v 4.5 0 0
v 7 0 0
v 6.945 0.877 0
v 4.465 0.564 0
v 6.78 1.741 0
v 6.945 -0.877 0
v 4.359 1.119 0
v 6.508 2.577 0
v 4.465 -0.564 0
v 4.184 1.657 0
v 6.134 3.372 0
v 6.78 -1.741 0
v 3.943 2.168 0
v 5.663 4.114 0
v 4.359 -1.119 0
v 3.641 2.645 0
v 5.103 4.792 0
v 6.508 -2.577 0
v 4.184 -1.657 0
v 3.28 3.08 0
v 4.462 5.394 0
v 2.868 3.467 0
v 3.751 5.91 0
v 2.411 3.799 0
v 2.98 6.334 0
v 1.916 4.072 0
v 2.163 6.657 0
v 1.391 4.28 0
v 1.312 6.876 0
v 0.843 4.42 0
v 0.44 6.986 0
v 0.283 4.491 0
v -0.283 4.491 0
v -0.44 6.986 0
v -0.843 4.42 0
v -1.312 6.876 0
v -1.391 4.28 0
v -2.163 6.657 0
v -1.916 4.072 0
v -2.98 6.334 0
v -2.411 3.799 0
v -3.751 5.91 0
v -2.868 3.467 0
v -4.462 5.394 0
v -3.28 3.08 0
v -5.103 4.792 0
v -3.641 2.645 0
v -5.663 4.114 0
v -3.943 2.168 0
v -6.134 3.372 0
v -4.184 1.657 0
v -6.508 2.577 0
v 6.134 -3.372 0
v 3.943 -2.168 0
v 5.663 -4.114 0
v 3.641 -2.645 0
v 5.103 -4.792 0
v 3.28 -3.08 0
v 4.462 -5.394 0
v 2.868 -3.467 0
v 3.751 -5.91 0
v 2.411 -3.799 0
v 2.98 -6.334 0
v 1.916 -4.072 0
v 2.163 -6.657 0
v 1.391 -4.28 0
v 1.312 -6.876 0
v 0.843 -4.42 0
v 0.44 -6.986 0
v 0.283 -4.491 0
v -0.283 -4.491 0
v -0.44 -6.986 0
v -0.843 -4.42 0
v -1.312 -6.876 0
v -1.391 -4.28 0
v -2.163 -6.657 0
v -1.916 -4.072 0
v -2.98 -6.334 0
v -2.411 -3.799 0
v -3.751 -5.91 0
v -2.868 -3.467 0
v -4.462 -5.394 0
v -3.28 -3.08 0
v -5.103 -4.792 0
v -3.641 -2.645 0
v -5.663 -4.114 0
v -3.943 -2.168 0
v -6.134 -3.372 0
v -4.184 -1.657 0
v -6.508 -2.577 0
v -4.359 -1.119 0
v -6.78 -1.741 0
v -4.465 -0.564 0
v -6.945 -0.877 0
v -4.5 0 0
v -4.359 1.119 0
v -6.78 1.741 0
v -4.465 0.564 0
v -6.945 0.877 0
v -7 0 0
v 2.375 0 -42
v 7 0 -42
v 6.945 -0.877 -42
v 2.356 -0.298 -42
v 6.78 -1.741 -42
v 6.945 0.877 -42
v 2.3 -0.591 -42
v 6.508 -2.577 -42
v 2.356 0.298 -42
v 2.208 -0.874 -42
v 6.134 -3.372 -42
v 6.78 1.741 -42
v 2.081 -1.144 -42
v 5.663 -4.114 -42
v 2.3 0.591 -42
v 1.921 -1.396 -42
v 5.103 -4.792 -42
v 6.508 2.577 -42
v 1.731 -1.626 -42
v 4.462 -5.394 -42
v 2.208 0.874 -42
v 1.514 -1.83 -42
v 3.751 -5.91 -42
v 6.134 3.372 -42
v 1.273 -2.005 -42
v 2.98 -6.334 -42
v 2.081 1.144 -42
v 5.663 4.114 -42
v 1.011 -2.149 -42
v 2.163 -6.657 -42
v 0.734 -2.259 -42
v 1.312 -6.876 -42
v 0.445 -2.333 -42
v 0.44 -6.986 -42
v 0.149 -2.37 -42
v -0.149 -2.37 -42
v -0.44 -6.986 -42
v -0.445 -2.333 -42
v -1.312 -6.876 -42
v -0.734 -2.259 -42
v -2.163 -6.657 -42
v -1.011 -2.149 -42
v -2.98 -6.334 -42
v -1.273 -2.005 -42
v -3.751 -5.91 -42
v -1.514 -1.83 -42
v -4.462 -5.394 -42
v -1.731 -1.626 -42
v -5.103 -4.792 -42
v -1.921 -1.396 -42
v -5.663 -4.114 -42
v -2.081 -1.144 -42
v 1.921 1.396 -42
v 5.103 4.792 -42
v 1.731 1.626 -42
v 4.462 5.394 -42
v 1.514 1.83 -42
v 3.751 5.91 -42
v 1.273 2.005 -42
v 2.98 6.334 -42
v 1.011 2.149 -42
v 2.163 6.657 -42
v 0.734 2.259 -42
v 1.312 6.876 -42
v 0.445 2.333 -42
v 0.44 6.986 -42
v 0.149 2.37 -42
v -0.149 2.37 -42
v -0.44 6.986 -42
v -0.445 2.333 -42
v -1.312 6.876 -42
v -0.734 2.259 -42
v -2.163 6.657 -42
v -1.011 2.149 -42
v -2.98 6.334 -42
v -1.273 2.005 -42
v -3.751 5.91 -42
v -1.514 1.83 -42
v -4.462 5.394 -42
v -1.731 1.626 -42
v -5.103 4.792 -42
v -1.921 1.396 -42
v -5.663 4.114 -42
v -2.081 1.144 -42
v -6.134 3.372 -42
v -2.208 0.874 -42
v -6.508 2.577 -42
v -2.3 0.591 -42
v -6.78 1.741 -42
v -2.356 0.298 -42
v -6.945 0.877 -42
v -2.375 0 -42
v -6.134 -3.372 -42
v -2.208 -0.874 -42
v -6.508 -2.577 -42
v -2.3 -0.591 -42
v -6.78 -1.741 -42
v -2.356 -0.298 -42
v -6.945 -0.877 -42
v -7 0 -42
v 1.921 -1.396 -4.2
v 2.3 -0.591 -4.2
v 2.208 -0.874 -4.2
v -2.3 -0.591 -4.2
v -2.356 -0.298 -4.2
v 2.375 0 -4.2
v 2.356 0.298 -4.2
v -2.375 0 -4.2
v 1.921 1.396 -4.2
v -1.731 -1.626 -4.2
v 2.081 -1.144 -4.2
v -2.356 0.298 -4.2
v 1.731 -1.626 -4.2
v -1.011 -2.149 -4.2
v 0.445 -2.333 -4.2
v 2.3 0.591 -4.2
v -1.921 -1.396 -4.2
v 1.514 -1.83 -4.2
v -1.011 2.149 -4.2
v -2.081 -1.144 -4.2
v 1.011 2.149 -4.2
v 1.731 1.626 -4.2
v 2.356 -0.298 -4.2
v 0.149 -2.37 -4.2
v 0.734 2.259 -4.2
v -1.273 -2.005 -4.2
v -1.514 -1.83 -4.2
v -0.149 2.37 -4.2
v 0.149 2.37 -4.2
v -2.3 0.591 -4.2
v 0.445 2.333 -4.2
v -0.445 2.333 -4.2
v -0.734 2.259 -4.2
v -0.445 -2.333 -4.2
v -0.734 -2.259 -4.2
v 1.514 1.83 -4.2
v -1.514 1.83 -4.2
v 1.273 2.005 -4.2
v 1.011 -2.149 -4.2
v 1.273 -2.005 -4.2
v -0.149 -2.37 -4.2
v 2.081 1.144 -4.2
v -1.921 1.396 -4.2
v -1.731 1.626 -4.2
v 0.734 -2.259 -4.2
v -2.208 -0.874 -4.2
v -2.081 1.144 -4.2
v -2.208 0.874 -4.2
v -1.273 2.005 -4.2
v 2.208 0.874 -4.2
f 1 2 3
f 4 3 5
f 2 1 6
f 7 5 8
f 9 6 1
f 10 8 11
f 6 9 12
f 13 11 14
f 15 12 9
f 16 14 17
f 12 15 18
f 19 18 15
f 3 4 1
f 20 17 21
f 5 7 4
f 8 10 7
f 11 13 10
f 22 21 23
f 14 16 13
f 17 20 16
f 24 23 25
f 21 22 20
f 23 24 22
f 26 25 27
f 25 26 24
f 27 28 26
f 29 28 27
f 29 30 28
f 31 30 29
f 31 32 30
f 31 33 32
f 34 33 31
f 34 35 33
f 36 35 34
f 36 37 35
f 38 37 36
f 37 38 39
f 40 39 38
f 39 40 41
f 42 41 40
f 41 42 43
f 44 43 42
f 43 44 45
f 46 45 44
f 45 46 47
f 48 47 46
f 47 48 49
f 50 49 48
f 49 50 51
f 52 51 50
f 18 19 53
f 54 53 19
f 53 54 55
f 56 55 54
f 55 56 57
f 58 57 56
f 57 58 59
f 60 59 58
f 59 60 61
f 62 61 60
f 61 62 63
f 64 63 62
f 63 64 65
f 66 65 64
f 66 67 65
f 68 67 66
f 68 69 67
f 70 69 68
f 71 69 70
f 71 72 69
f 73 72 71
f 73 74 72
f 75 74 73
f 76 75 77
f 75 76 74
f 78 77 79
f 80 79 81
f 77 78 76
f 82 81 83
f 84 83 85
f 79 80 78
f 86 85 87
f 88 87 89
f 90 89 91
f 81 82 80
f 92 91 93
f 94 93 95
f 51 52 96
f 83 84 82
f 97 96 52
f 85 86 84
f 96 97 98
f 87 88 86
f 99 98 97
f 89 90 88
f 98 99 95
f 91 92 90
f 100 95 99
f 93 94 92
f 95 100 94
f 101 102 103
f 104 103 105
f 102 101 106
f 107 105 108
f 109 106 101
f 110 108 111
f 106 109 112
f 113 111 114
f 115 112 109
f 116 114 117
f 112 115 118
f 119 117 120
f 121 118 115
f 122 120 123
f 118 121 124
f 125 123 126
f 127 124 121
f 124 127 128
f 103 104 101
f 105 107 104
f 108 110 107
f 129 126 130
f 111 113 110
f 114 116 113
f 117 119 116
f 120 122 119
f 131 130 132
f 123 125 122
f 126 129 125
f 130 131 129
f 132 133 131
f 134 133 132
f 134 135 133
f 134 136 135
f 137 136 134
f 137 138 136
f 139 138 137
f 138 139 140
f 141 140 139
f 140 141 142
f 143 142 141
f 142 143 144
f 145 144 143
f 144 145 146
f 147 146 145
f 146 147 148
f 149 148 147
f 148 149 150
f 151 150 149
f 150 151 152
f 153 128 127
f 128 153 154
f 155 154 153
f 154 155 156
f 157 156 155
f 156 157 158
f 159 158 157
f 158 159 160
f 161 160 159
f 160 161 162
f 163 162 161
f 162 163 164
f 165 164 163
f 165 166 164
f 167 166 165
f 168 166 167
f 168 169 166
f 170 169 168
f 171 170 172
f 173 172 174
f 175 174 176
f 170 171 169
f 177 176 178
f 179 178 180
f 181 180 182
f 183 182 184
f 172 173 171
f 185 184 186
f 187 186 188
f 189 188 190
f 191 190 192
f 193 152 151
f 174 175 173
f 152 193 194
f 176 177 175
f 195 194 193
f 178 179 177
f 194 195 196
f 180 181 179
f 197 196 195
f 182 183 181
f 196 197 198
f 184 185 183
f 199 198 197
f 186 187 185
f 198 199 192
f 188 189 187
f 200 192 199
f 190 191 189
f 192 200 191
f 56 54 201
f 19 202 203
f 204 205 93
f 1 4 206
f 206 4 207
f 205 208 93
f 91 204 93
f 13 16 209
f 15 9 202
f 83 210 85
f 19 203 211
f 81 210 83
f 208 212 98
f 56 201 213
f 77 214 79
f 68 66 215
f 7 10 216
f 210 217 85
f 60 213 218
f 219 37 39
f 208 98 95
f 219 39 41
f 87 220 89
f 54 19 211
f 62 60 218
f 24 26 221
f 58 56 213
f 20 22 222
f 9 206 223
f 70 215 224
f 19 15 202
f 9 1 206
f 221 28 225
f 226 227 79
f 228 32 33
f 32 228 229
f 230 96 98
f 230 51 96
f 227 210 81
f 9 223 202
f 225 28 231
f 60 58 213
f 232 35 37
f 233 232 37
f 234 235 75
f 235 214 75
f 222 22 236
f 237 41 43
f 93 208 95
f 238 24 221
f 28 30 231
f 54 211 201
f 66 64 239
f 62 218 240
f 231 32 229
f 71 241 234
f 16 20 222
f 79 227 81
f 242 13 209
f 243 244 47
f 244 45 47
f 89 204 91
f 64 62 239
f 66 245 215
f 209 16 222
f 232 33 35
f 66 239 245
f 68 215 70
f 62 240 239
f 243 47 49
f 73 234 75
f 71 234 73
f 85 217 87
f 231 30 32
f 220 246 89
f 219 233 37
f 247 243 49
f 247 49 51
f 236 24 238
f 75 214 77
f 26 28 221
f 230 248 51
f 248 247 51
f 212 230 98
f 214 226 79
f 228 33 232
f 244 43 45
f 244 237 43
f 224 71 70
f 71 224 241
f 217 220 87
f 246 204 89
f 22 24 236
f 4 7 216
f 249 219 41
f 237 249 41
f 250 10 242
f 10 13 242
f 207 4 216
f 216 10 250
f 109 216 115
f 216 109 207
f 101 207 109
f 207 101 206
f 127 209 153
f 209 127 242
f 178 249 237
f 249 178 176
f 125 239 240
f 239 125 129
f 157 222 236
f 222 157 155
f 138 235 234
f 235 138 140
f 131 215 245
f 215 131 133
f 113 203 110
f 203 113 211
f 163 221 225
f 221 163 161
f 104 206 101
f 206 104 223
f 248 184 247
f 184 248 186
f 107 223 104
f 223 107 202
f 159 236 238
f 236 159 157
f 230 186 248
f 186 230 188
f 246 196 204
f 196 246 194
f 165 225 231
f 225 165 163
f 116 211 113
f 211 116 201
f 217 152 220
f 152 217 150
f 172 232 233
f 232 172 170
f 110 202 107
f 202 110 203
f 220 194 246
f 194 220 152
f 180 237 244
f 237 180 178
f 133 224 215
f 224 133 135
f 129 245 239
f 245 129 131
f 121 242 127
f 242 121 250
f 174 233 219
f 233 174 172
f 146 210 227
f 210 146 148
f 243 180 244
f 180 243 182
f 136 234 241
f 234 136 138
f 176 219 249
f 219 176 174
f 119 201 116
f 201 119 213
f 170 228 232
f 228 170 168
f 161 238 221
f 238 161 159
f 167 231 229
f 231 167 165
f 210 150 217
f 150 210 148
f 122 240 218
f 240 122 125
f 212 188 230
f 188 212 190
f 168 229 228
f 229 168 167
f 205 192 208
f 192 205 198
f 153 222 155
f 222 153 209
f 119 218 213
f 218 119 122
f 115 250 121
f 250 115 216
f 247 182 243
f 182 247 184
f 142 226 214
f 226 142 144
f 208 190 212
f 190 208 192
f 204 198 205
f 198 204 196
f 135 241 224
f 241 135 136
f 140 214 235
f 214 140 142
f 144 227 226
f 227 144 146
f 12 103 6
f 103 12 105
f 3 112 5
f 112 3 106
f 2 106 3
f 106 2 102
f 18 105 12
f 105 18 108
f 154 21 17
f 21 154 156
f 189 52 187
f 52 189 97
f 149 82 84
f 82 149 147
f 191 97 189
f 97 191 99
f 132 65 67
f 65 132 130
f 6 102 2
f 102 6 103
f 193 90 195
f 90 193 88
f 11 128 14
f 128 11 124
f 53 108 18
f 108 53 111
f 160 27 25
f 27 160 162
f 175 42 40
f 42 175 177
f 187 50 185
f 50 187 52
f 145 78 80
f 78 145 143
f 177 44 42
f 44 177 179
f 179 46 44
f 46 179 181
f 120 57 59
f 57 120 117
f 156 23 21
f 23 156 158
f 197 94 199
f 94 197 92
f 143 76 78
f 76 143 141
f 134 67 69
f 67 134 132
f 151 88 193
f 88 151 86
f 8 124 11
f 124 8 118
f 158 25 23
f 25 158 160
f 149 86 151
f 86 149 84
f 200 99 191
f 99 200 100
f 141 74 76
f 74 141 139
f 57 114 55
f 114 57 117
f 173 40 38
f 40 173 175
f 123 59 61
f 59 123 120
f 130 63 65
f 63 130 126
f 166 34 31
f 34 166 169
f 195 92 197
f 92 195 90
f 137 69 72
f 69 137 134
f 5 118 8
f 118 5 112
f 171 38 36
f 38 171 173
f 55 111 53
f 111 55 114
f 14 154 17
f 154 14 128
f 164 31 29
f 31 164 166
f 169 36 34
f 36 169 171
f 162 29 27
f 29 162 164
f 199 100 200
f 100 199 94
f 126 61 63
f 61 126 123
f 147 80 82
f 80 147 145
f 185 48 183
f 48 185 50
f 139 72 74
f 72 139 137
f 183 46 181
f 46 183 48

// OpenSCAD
$fn = 50;


difference() {
	union() {
		translate(v = [0, 0, -42.0000000000]) {
			cylinder(h = 42, r = 7.0000000000);
		}
		cylinder(h = 0, r = 16.0000000000);
	}
	union() {
		translate(v = [0, 0, 0]) {
			rotate(a = [0, 0, 0]) {
				difference() {
					union() {
						#translate(v = [0, 0, -42.0000000000]) {
							cylinder(h = 42, r = 2.2500000000);
						}
						#translate(v = [0, 0, -4.2000000000]) {
							cylinder(h = 4.2000000000, r = 7.0000000000, r1 = 2.3750000000, r2 = 4.5000000000);
						}
						#translate(v = [0, 0, -42.0000000000]) {
							cylinder(h = 42, r = 2.3750000000);
						}
						#translate(v = [0, 0, -42.0000000000]) {
							cylinder(h = 42, r = 2.2500000000);
						}
					}
					union();
				}
			}
		}
	}
}
